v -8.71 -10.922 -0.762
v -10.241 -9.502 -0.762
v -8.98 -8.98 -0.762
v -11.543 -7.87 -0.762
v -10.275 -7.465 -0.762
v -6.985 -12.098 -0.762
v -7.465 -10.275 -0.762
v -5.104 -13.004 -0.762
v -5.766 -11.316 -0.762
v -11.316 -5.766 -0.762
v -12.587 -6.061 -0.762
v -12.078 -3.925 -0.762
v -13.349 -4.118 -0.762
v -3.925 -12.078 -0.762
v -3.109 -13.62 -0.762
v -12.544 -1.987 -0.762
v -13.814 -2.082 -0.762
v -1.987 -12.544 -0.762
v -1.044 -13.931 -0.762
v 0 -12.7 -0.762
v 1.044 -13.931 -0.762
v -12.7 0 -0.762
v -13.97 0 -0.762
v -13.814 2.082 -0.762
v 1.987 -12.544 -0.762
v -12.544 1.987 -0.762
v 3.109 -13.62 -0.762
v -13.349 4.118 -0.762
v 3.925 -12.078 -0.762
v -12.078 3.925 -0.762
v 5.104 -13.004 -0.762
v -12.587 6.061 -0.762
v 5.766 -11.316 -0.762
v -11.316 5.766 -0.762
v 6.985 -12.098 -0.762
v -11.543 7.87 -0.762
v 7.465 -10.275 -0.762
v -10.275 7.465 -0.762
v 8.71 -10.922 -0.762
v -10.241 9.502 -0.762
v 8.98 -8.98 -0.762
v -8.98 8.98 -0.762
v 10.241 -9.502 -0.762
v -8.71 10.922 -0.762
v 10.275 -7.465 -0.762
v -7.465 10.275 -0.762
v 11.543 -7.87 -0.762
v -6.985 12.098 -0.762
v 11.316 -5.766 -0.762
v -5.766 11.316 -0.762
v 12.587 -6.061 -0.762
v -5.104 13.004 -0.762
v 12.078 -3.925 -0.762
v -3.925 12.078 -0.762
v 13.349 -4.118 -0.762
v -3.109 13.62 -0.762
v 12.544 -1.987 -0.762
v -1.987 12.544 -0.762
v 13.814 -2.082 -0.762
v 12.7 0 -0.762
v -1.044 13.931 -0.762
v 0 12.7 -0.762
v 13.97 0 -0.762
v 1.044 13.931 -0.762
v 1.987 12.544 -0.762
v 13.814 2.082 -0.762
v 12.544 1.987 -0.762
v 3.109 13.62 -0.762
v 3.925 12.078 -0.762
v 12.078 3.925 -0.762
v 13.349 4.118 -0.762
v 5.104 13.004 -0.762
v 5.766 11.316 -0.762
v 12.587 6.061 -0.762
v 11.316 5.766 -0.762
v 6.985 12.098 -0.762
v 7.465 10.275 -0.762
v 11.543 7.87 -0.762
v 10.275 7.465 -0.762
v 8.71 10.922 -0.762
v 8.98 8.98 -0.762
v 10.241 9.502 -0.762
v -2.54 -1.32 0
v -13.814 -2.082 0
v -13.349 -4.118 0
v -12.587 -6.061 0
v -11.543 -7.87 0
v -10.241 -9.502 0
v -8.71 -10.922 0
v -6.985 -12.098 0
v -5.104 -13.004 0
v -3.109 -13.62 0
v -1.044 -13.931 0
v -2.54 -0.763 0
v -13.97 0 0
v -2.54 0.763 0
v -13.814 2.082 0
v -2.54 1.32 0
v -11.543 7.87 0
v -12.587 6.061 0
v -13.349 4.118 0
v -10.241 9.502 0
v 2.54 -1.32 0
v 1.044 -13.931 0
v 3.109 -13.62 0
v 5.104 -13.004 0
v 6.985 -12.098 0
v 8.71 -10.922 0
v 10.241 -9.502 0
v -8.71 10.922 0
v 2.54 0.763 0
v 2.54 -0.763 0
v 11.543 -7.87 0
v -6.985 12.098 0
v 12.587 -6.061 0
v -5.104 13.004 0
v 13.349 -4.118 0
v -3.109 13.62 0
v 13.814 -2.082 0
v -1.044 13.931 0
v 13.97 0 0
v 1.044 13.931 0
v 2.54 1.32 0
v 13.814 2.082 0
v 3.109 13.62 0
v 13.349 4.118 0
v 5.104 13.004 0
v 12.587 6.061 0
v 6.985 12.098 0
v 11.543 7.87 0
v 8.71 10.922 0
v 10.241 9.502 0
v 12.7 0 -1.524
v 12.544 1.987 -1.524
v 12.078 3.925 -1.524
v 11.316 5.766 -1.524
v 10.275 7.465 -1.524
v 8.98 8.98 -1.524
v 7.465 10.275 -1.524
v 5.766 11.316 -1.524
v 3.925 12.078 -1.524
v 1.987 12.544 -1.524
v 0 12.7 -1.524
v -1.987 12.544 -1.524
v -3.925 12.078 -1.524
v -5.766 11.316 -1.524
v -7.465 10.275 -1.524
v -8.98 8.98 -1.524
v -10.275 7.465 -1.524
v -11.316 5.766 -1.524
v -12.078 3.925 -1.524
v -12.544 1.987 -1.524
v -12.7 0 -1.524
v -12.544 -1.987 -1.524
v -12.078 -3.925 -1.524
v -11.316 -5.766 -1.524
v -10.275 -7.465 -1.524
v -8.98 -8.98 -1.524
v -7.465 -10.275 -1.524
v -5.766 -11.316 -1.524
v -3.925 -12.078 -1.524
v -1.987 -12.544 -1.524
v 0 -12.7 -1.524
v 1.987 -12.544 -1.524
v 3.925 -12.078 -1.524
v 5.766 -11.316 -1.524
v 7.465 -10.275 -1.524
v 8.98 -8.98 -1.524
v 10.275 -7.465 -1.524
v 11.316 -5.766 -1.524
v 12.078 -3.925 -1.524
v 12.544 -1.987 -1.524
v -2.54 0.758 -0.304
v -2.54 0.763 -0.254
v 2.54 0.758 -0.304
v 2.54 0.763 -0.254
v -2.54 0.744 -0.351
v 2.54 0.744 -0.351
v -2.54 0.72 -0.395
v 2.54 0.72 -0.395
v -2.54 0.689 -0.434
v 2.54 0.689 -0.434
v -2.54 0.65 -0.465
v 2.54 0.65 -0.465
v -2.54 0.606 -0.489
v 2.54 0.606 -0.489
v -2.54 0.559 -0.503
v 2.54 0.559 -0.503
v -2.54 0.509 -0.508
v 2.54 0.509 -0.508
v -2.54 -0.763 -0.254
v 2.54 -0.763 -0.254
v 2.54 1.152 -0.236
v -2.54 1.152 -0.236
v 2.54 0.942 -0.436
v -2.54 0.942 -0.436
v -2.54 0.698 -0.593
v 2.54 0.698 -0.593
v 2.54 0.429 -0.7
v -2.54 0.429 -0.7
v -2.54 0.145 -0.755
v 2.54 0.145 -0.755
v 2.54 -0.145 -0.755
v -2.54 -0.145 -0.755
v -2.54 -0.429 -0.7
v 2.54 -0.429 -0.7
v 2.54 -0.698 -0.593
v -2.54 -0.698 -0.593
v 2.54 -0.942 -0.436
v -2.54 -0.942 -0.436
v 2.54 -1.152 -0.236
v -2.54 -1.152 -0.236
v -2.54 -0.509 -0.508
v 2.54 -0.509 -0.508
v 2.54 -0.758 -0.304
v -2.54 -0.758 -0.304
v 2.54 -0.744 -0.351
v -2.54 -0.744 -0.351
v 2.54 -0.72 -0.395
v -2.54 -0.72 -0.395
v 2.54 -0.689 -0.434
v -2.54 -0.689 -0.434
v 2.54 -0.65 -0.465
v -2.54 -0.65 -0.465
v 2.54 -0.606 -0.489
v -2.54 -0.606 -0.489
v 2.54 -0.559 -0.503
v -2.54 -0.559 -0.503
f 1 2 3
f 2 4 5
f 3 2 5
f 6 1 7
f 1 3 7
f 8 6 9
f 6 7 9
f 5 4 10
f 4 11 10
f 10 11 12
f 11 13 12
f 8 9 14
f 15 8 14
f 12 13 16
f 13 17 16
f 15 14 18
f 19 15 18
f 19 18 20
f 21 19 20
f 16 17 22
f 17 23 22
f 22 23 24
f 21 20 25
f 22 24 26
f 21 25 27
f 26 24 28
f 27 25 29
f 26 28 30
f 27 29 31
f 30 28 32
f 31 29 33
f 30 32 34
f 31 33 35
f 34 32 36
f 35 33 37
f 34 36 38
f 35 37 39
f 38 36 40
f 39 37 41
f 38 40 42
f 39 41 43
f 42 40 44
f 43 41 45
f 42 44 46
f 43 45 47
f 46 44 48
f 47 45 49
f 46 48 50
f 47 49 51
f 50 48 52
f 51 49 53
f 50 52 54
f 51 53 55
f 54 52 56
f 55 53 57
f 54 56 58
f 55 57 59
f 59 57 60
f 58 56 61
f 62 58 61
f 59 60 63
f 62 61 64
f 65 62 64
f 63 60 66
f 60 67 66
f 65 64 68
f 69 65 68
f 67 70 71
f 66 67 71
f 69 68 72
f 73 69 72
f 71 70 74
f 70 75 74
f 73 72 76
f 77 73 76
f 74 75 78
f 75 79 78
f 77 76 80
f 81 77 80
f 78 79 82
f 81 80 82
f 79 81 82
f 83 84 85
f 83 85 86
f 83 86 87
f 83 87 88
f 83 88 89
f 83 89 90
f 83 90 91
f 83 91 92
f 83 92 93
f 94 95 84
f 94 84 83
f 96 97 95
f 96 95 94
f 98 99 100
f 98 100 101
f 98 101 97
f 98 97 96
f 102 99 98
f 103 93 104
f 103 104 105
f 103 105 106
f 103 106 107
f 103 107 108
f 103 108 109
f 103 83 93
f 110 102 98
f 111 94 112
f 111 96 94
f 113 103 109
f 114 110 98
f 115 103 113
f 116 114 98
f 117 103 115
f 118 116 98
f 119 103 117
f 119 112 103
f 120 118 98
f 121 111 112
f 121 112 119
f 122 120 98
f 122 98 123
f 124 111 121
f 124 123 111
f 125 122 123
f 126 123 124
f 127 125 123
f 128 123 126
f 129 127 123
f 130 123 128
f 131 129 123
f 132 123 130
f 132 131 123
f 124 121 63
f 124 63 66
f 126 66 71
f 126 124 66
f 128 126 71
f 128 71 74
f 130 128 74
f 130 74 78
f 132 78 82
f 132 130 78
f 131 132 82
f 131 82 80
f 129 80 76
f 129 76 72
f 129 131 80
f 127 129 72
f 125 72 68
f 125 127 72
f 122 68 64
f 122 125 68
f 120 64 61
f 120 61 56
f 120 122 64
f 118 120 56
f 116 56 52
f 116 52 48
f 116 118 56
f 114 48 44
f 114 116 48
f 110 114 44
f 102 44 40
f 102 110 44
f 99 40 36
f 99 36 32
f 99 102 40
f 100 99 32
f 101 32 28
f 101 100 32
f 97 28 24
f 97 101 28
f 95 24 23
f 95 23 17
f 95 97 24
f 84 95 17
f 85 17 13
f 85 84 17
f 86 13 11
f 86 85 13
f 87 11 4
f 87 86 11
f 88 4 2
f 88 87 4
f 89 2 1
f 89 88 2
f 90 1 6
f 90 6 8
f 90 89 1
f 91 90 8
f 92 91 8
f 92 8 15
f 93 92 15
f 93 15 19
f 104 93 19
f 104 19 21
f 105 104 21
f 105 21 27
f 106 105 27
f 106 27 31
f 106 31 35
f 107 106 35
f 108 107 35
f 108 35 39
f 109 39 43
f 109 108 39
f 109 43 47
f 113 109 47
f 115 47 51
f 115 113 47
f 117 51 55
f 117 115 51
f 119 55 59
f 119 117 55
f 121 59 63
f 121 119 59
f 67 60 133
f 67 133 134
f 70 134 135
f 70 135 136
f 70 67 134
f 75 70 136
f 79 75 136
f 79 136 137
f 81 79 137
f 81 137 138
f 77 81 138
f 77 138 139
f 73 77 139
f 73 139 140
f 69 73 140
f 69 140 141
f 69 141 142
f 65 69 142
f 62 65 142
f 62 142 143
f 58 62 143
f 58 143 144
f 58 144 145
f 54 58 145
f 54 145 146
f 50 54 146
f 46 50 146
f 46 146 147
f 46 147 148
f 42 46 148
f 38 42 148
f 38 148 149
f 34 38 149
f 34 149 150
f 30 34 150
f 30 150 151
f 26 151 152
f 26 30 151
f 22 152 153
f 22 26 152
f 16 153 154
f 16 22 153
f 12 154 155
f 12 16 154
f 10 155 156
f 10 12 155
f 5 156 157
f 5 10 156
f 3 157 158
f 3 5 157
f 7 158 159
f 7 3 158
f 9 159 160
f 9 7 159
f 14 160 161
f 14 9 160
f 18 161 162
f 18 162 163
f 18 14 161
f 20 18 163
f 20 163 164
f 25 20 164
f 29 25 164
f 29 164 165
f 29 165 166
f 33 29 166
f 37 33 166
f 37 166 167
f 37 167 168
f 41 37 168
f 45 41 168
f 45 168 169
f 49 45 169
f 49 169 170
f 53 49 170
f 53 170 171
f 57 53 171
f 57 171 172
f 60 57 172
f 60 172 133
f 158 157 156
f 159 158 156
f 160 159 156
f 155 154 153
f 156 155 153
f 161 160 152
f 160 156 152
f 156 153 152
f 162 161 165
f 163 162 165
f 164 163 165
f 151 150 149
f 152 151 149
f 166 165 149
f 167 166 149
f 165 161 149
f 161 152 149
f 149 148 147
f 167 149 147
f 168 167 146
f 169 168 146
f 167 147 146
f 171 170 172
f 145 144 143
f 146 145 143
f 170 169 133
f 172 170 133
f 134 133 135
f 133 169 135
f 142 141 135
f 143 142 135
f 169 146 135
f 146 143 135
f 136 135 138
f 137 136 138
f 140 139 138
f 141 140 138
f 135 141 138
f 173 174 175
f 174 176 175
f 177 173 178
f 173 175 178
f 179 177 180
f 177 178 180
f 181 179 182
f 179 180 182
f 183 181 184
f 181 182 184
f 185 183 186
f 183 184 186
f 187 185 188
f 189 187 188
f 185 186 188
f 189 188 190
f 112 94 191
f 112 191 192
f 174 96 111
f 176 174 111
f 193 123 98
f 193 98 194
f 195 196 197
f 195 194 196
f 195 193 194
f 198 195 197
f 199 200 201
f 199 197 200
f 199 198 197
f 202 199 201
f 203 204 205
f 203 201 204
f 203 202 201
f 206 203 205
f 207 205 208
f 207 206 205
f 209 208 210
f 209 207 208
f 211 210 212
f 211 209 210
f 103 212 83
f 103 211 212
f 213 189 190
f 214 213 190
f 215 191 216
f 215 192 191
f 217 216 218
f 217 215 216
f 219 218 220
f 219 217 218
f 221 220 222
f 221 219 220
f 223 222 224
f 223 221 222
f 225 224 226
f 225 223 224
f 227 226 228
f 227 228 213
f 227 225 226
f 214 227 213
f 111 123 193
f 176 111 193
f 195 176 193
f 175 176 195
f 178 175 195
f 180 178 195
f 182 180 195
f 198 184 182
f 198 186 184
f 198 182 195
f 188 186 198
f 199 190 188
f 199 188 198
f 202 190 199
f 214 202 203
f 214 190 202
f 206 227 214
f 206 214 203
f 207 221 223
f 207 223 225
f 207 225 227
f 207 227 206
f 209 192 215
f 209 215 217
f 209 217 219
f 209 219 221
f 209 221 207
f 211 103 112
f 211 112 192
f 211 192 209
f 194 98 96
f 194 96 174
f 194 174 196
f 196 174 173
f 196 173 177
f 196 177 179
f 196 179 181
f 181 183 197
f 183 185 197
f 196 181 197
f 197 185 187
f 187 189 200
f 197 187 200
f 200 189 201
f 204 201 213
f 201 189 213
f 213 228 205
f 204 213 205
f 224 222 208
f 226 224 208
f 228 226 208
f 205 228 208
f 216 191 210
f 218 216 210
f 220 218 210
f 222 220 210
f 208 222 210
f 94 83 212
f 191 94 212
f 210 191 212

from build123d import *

# Parameters (mm, degrees)
F0_R     = 12.7
F1_DEPTH = 1.524
F2_R     = 13.97
F3_DEPTH = 0.762
F4_W     = 5.08
F4_H     = 1.524
F6_W     = 5.08000508
F6_H     = 1.5265774739
F7_DEPTH = 0.508
F8_R     = 0.254


with BuildPart() as f1:
    # F0 (on Top) → F1 (new body)
    with BuildSketch(Plane.XY):
        Circle(F0_R)
    extrude(amount=-F1_DEPTH)

    # F2 (on Top) → F3 (join)
    with BuildSketch(Plane.XY):
        Circle(F2_R)
    extrude(amount=-F3_DEPTH)

    # F4 (on Front) → F5 (revolve, cut)
    with BuildSketch(Plane.XZ):
        Rectangle(F4_W, F4_H)
    revolve(axis=Axis((0, 0, 0.762), (-1, 0, 0)), mode=Mode.SUBTRACT)

    # F6 (on Top) → F7 (join)
    with BuildSketch(Plane.XY):
        Rectangle(F6_W, F6_H)
    extrude(amount=-F7_DEPTH)

    # F8
    f8_edges = [f1.edges().sort_by_distance(p)[0] for p in [
        (0, 0.763289, -0.508),
        (0, -0.763289, -0.508),
    ]]
    fillet(f8_edges, radius=F8_R)


solid = f1.part
